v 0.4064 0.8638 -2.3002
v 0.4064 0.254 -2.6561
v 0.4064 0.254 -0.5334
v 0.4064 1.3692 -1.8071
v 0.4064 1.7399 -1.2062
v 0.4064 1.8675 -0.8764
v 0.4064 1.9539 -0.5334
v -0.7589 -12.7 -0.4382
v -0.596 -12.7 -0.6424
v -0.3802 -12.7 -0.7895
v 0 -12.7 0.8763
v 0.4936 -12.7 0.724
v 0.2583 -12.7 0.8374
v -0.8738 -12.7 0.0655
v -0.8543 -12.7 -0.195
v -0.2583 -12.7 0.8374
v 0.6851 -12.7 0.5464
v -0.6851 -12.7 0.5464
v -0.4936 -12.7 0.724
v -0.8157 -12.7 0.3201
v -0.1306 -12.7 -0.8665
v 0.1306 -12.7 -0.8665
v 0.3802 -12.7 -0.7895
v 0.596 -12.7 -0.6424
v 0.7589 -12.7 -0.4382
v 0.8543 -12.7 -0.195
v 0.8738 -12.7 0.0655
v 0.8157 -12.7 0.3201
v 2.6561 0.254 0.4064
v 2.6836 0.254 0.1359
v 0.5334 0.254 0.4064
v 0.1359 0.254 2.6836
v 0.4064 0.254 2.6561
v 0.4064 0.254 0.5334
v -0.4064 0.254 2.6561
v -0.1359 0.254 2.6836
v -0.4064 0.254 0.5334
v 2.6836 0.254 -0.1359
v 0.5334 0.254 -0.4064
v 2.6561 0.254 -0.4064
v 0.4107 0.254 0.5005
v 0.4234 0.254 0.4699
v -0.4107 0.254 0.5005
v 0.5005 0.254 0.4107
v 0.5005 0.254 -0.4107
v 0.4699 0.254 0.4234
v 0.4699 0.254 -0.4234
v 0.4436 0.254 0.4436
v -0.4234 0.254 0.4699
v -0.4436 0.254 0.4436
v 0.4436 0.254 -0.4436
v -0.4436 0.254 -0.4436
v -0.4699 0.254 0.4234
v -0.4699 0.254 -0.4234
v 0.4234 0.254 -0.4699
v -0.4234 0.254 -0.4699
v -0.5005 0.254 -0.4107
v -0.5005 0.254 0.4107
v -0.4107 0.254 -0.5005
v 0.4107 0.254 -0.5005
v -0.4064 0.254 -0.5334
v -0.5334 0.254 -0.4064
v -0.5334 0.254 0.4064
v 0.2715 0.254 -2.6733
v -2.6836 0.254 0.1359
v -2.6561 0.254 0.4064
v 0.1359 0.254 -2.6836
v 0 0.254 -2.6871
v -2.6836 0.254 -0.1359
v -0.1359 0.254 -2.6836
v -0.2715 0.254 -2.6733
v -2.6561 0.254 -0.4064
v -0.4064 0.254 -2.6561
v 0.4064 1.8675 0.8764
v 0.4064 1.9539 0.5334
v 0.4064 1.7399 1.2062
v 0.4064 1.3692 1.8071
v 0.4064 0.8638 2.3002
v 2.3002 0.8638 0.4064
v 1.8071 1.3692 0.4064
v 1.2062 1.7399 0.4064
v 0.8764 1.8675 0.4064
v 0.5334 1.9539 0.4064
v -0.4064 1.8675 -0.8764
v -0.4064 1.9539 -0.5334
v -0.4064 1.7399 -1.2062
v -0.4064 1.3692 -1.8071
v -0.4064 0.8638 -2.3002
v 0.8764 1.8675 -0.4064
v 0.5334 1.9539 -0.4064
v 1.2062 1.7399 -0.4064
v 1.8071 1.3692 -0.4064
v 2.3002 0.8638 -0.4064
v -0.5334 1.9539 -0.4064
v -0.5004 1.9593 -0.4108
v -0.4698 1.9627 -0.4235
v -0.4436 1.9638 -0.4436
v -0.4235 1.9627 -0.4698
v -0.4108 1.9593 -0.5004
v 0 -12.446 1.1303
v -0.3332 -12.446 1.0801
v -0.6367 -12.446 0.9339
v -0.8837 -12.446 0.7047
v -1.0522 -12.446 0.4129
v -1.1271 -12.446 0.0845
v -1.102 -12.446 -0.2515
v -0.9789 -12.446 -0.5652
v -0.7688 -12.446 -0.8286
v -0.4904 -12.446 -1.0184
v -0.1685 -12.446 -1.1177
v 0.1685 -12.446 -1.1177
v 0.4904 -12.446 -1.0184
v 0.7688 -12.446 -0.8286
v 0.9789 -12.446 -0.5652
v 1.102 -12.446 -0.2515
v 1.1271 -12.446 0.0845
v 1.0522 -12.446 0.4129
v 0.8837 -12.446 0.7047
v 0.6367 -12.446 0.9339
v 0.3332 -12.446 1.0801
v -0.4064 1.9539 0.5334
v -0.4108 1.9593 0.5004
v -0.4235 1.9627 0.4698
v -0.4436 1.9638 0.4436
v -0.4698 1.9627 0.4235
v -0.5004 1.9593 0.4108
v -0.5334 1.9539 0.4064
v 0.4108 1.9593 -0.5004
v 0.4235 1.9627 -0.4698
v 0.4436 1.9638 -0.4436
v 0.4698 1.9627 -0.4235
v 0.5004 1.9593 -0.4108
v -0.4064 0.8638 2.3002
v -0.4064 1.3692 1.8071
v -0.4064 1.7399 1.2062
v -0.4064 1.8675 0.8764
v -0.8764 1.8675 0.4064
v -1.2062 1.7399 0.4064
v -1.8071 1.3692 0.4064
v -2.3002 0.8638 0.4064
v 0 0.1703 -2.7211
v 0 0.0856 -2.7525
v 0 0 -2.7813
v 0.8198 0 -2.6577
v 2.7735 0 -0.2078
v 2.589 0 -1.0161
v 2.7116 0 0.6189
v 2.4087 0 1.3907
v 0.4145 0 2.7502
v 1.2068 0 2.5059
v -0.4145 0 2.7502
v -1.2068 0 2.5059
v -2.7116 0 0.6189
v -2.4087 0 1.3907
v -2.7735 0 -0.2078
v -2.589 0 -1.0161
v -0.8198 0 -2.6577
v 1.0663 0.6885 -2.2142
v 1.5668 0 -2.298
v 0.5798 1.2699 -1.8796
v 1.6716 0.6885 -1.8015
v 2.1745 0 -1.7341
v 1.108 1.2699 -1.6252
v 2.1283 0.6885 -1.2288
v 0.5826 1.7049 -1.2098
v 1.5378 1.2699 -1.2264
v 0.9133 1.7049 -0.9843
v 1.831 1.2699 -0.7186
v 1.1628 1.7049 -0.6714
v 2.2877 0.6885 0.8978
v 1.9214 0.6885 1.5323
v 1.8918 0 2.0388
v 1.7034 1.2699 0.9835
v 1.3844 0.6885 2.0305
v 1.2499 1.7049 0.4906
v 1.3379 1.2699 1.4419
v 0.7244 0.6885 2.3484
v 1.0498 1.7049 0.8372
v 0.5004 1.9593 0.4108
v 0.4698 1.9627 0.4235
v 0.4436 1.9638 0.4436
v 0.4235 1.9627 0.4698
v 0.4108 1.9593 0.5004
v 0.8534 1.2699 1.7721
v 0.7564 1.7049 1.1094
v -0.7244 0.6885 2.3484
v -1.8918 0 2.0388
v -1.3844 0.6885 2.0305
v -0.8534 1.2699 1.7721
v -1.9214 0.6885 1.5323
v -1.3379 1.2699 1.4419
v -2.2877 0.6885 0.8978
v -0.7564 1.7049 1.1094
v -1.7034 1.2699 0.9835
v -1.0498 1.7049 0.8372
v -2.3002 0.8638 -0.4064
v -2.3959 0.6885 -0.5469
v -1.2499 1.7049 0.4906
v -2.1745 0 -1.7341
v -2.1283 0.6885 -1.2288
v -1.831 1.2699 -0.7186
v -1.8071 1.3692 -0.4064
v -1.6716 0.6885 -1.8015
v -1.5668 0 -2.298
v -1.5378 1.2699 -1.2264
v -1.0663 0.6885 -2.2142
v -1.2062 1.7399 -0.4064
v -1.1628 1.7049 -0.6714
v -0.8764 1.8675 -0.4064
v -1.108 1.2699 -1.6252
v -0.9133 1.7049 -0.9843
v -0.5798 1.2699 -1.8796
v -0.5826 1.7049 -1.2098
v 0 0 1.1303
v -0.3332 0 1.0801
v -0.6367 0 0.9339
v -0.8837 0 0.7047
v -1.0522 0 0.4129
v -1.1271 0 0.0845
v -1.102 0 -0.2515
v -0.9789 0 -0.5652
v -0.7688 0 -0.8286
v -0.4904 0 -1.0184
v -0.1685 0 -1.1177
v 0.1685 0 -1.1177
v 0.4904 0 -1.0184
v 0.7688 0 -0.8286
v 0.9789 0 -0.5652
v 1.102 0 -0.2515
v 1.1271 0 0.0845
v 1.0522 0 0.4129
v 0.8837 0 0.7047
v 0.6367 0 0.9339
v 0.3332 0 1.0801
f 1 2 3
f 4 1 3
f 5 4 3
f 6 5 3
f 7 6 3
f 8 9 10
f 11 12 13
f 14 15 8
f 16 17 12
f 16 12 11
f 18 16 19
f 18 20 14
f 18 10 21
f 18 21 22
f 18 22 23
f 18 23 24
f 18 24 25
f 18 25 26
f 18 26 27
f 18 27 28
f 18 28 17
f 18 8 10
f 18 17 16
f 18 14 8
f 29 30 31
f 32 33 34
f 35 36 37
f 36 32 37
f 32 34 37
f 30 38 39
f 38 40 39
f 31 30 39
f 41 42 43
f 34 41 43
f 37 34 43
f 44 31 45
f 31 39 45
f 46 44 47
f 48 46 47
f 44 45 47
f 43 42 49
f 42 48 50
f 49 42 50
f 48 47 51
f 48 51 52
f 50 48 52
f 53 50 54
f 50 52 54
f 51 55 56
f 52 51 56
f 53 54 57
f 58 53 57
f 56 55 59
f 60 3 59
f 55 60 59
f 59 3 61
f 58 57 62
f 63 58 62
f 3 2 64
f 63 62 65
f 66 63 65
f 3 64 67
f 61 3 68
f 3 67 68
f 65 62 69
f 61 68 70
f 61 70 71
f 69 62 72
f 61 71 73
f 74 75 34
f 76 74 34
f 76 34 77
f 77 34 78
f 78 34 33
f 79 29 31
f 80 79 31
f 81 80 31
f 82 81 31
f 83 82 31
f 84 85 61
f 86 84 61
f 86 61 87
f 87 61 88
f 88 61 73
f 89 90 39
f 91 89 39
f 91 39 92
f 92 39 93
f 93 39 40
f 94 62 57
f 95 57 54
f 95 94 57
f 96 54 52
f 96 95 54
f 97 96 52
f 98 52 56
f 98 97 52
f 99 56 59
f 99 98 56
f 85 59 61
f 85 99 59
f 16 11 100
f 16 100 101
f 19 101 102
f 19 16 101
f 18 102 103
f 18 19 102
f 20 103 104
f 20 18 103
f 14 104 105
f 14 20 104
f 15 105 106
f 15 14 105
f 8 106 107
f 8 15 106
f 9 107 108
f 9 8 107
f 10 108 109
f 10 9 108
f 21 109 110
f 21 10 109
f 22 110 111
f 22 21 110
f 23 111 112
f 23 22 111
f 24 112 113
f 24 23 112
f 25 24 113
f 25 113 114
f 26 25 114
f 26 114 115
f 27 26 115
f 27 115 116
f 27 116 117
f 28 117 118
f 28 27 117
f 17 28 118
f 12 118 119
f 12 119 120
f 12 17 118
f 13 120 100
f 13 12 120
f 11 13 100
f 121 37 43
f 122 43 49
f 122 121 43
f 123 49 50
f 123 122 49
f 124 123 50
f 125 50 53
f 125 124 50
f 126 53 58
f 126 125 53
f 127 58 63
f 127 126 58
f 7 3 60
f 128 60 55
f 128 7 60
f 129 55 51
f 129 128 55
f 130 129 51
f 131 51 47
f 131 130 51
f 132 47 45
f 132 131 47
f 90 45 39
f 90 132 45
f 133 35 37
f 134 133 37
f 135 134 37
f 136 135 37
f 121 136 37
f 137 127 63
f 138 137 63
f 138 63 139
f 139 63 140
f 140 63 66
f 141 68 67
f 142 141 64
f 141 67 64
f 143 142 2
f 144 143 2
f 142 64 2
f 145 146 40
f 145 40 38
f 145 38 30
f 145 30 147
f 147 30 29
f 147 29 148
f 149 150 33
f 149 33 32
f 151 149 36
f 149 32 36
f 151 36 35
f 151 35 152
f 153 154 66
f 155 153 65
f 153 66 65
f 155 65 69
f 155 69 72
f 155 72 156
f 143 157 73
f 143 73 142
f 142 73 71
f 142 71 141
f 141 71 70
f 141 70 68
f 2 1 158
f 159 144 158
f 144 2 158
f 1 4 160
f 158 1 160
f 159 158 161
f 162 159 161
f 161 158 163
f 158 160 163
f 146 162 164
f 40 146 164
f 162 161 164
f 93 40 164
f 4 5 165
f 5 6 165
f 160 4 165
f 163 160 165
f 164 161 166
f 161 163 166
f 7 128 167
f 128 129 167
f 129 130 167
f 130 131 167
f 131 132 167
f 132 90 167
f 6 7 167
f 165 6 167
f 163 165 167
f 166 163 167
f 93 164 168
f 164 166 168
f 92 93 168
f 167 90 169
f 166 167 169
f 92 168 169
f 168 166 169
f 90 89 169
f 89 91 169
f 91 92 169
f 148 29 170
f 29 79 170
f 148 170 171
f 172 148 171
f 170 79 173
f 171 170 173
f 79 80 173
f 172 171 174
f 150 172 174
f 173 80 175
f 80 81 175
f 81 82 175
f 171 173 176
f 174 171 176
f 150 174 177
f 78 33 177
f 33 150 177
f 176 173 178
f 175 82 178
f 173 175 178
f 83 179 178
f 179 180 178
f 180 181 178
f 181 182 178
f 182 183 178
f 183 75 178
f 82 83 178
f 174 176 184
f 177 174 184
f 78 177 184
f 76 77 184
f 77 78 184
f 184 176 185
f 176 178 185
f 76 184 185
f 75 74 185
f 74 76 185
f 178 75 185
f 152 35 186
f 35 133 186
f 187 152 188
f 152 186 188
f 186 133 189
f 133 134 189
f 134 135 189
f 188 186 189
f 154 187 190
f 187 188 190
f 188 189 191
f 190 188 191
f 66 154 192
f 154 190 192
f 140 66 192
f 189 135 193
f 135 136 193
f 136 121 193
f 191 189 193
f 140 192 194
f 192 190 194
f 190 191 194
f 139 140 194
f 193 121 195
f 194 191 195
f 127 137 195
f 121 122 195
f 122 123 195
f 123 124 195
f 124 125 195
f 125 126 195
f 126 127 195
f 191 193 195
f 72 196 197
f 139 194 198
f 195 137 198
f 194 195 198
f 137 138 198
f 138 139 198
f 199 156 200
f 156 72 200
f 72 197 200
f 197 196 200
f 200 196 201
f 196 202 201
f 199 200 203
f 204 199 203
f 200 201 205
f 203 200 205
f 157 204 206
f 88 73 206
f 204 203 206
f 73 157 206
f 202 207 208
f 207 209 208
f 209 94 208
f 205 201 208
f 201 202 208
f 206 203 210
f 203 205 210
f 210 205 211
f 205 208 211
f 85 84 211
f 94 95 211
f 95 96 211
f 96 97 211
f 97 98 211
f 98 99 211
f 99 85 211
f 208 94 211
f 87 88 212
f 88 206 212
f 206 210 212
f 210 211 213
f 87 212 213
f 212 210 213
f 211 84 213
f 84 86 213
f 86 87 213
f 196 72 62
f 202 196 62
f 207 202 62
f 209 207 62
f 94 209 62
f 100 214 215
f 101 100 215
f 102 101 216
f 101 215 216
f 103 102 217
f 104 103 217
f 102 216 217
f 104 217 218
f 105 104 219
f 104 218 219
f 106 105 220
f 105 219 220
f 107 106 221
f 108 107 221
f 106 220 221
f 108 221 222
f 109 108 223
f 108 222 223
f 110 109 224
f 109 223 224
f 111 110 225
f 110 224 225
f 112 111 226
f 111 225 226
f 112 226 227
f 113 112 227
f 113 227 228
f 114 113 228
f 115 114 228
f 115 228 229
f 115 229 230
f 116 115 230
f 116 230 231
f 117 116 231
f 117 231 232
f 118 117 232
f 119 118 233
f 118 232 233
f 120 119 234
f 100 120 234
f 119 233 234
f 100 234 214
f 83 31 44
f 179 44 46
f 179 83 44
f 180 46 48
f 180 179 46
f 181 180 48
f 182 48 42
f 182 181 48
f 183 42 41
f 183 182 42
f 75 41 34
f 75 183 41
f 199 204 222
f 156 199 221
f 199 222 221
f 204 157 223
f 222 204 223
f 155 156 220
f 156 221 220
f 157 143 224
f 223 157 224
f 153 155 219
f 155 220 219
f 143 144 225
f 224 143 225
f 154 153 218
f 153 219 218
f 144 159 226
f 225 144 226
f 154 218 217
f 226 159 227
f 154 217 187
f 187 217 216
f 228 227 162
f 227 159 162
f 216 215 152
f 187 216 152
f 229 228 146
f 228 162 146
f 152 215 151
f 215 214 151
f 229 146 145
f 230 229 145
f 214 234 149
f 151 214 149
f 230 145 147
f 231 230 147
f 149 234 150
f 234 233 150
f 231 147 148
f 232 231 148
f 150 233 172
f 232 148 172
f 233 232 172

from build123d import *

# Parameters (mm, degrees)
SKETCH3_R        = 1.1303
SHAFT_DEPTH      = 12.7
TIP_SIZE         = 0.254
PHILLIPS_START   = 0.254
PHILLIPS_DEPTH   = 14.041159246
PHILLIPSFILLET_R = 0.127


with BuildPart() as part:
    # Sketch2 → Head (revolve)
    with BuildSketch(Plane(origin=(0, 0, 0), x_dir=(0, 0, -1), z_dir=(1, 0, 0))):
        with BuildLine():
            Line((0, 0), (2.7813, 0))
            ThreePointArc((2.7813, 0), (1.72225533, 1.469884796), (0, 2.032))
            Line((0, 2.032), (0, 0))
        make_face()
    revolve(axis=Axis((0, 0.415157056, 0), (0, -1, 0)))

    # Sketch3 → Shaft (add)
    with BuildSketch(Plane.XZ):
        with Locations(Location((0, 0, 0), (0, 0, 90))):
            Circle(SKETCH3_R)
    extrude(amount=SHAFT_DEPTH)

    # Tip
    tip_edges = [part.edges().sort_by_distance(p)[0] for p in [
        (0, -12.7, -1.1303),
    ]]
    chamfer(tip_edges, length=TIP_SIZE)

    # Sketch4 → Phillips (cut, through all)
    with BuildSketch(Plane(origin=(0, 0, 0), x_dir=(1, 0, 0), z_dir=(0, 1, 0)).offset(PHILLIPS_START)):
        Polygon((-0.4064, 0.4064), (-0.4064, 2.7813), (0.4064, 2.7813), (0.4064, 0.4064), (2.7813, 0.4064), (2.7813, -0.4064), (0.4064, -0.4064), (0.4064, -2.7813), (-0.4064, -2.7813), (-0.4064, -0.4064), (-2.7813, -0.4064), (-2.7813, 0.4064), align=None)
    extrude(amount=PHILLIPS_DEPTH, mode=Mode.SUBTRACT)

    # PhillipsFillet
    phillipsfillet_edges = [part.edges().sort_by_distance(p)[0] for p in [
        (0.4064, 1.114434201, -0.4064),
        (-0.4064, 1.114434201, -0.4064),
        (-0.4064, 1.114434201, 0.4064),
        (0.4064, 1.114434201, 0.4064),
    ]]
    fillet(phillipsfillet_edges, radius=PHILLIPSFILLET_R)


solid = part.part
